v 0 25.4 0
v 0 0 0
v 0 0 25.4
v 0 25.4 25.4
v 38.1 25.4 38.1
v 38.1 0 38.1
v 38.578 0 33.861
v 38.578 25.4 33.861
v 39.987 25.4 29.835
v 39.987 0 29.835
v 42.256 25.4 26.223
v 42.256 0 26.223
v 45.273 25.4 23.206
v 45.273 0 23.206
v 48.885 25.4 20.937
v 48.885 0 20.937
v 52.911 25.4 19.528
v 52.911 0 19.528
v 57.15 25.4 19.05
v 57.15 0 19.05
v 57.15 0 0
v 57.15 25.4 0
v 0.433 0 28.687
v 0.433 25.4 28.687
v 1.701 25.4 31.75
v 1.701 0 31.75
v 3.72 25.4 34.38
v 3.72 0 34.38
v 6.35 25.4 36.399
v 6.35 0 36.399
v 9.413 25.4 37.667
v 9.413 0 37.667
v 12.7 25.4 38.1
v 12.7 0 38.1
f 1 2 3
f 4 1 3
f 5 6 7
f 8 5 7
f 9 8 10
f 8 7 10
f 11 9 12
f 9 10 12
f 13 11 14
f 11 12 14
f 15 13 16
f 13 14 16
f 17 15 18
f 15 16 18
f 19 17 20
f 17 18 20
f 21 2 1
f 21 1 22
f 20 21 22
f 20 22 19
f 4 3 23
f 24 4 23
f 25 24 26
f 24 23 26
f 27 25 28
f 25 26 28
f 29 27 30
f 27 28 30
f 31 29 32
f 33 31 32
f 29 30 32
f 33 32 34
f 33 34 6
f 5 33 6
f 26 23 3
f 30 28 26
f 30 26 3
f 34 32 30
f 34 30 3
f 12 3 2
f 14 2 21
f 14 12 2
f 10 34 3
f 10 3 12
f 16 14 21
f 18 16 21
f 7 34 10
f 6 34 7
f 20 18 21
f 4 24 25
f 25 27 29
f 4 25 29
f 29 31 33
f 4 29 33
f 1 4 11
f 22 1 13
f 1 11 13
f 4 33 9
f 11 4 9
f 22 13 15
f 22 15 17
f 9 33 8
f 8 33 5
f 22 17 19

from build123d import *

# Parameters (mm, degrees)
F0_W     = 57.15
F0_H     = 38.1
F1_DEPTH = 25.4
F3_DEPTH = 25.4
F5_DEPTH = 25.4


with BuildPart() as f1:
    # F0 (on Front) → F1 (new body)
    with BuildSketch(Plane.XZ):
        with Locations((28.575, 19.05)):
            Rectangle(F0_W, F0_H)
    extrude(amount=-F1_DEPTH)

    # F2 (on Front) → F3 (cut)
    with BuildSketch(Plane.XZ):
        with BuildLine():
            Line((57.15, 38.1), (38.1, 38.1))
            ThreePointArc((38.1, 38.1), (43.679616, 24.629616), (57.15, 19.05))
            Line((57.15, 19.05), (57.15, 38.1))
        make_face()
    extrude(amount=-F3_DEPTH, mode=Mode.SUBTRACT)

    # F4 (on Front) → F5 (cut)
    with BuildSketch(Plane.XZ):
        with BuildLine():
            ThreePointArc((0, 25.4), (3.719744, 34.380256), (12.7, 38.1))
            Line((12.7, 38.1), (0, 38.1))
            Line((0, 38.1), (0, 25.4))
        make_face()
    extrude(amount=-F5_DEPTH, mode=Mode.SUBTRACT)


solid = f1.part
